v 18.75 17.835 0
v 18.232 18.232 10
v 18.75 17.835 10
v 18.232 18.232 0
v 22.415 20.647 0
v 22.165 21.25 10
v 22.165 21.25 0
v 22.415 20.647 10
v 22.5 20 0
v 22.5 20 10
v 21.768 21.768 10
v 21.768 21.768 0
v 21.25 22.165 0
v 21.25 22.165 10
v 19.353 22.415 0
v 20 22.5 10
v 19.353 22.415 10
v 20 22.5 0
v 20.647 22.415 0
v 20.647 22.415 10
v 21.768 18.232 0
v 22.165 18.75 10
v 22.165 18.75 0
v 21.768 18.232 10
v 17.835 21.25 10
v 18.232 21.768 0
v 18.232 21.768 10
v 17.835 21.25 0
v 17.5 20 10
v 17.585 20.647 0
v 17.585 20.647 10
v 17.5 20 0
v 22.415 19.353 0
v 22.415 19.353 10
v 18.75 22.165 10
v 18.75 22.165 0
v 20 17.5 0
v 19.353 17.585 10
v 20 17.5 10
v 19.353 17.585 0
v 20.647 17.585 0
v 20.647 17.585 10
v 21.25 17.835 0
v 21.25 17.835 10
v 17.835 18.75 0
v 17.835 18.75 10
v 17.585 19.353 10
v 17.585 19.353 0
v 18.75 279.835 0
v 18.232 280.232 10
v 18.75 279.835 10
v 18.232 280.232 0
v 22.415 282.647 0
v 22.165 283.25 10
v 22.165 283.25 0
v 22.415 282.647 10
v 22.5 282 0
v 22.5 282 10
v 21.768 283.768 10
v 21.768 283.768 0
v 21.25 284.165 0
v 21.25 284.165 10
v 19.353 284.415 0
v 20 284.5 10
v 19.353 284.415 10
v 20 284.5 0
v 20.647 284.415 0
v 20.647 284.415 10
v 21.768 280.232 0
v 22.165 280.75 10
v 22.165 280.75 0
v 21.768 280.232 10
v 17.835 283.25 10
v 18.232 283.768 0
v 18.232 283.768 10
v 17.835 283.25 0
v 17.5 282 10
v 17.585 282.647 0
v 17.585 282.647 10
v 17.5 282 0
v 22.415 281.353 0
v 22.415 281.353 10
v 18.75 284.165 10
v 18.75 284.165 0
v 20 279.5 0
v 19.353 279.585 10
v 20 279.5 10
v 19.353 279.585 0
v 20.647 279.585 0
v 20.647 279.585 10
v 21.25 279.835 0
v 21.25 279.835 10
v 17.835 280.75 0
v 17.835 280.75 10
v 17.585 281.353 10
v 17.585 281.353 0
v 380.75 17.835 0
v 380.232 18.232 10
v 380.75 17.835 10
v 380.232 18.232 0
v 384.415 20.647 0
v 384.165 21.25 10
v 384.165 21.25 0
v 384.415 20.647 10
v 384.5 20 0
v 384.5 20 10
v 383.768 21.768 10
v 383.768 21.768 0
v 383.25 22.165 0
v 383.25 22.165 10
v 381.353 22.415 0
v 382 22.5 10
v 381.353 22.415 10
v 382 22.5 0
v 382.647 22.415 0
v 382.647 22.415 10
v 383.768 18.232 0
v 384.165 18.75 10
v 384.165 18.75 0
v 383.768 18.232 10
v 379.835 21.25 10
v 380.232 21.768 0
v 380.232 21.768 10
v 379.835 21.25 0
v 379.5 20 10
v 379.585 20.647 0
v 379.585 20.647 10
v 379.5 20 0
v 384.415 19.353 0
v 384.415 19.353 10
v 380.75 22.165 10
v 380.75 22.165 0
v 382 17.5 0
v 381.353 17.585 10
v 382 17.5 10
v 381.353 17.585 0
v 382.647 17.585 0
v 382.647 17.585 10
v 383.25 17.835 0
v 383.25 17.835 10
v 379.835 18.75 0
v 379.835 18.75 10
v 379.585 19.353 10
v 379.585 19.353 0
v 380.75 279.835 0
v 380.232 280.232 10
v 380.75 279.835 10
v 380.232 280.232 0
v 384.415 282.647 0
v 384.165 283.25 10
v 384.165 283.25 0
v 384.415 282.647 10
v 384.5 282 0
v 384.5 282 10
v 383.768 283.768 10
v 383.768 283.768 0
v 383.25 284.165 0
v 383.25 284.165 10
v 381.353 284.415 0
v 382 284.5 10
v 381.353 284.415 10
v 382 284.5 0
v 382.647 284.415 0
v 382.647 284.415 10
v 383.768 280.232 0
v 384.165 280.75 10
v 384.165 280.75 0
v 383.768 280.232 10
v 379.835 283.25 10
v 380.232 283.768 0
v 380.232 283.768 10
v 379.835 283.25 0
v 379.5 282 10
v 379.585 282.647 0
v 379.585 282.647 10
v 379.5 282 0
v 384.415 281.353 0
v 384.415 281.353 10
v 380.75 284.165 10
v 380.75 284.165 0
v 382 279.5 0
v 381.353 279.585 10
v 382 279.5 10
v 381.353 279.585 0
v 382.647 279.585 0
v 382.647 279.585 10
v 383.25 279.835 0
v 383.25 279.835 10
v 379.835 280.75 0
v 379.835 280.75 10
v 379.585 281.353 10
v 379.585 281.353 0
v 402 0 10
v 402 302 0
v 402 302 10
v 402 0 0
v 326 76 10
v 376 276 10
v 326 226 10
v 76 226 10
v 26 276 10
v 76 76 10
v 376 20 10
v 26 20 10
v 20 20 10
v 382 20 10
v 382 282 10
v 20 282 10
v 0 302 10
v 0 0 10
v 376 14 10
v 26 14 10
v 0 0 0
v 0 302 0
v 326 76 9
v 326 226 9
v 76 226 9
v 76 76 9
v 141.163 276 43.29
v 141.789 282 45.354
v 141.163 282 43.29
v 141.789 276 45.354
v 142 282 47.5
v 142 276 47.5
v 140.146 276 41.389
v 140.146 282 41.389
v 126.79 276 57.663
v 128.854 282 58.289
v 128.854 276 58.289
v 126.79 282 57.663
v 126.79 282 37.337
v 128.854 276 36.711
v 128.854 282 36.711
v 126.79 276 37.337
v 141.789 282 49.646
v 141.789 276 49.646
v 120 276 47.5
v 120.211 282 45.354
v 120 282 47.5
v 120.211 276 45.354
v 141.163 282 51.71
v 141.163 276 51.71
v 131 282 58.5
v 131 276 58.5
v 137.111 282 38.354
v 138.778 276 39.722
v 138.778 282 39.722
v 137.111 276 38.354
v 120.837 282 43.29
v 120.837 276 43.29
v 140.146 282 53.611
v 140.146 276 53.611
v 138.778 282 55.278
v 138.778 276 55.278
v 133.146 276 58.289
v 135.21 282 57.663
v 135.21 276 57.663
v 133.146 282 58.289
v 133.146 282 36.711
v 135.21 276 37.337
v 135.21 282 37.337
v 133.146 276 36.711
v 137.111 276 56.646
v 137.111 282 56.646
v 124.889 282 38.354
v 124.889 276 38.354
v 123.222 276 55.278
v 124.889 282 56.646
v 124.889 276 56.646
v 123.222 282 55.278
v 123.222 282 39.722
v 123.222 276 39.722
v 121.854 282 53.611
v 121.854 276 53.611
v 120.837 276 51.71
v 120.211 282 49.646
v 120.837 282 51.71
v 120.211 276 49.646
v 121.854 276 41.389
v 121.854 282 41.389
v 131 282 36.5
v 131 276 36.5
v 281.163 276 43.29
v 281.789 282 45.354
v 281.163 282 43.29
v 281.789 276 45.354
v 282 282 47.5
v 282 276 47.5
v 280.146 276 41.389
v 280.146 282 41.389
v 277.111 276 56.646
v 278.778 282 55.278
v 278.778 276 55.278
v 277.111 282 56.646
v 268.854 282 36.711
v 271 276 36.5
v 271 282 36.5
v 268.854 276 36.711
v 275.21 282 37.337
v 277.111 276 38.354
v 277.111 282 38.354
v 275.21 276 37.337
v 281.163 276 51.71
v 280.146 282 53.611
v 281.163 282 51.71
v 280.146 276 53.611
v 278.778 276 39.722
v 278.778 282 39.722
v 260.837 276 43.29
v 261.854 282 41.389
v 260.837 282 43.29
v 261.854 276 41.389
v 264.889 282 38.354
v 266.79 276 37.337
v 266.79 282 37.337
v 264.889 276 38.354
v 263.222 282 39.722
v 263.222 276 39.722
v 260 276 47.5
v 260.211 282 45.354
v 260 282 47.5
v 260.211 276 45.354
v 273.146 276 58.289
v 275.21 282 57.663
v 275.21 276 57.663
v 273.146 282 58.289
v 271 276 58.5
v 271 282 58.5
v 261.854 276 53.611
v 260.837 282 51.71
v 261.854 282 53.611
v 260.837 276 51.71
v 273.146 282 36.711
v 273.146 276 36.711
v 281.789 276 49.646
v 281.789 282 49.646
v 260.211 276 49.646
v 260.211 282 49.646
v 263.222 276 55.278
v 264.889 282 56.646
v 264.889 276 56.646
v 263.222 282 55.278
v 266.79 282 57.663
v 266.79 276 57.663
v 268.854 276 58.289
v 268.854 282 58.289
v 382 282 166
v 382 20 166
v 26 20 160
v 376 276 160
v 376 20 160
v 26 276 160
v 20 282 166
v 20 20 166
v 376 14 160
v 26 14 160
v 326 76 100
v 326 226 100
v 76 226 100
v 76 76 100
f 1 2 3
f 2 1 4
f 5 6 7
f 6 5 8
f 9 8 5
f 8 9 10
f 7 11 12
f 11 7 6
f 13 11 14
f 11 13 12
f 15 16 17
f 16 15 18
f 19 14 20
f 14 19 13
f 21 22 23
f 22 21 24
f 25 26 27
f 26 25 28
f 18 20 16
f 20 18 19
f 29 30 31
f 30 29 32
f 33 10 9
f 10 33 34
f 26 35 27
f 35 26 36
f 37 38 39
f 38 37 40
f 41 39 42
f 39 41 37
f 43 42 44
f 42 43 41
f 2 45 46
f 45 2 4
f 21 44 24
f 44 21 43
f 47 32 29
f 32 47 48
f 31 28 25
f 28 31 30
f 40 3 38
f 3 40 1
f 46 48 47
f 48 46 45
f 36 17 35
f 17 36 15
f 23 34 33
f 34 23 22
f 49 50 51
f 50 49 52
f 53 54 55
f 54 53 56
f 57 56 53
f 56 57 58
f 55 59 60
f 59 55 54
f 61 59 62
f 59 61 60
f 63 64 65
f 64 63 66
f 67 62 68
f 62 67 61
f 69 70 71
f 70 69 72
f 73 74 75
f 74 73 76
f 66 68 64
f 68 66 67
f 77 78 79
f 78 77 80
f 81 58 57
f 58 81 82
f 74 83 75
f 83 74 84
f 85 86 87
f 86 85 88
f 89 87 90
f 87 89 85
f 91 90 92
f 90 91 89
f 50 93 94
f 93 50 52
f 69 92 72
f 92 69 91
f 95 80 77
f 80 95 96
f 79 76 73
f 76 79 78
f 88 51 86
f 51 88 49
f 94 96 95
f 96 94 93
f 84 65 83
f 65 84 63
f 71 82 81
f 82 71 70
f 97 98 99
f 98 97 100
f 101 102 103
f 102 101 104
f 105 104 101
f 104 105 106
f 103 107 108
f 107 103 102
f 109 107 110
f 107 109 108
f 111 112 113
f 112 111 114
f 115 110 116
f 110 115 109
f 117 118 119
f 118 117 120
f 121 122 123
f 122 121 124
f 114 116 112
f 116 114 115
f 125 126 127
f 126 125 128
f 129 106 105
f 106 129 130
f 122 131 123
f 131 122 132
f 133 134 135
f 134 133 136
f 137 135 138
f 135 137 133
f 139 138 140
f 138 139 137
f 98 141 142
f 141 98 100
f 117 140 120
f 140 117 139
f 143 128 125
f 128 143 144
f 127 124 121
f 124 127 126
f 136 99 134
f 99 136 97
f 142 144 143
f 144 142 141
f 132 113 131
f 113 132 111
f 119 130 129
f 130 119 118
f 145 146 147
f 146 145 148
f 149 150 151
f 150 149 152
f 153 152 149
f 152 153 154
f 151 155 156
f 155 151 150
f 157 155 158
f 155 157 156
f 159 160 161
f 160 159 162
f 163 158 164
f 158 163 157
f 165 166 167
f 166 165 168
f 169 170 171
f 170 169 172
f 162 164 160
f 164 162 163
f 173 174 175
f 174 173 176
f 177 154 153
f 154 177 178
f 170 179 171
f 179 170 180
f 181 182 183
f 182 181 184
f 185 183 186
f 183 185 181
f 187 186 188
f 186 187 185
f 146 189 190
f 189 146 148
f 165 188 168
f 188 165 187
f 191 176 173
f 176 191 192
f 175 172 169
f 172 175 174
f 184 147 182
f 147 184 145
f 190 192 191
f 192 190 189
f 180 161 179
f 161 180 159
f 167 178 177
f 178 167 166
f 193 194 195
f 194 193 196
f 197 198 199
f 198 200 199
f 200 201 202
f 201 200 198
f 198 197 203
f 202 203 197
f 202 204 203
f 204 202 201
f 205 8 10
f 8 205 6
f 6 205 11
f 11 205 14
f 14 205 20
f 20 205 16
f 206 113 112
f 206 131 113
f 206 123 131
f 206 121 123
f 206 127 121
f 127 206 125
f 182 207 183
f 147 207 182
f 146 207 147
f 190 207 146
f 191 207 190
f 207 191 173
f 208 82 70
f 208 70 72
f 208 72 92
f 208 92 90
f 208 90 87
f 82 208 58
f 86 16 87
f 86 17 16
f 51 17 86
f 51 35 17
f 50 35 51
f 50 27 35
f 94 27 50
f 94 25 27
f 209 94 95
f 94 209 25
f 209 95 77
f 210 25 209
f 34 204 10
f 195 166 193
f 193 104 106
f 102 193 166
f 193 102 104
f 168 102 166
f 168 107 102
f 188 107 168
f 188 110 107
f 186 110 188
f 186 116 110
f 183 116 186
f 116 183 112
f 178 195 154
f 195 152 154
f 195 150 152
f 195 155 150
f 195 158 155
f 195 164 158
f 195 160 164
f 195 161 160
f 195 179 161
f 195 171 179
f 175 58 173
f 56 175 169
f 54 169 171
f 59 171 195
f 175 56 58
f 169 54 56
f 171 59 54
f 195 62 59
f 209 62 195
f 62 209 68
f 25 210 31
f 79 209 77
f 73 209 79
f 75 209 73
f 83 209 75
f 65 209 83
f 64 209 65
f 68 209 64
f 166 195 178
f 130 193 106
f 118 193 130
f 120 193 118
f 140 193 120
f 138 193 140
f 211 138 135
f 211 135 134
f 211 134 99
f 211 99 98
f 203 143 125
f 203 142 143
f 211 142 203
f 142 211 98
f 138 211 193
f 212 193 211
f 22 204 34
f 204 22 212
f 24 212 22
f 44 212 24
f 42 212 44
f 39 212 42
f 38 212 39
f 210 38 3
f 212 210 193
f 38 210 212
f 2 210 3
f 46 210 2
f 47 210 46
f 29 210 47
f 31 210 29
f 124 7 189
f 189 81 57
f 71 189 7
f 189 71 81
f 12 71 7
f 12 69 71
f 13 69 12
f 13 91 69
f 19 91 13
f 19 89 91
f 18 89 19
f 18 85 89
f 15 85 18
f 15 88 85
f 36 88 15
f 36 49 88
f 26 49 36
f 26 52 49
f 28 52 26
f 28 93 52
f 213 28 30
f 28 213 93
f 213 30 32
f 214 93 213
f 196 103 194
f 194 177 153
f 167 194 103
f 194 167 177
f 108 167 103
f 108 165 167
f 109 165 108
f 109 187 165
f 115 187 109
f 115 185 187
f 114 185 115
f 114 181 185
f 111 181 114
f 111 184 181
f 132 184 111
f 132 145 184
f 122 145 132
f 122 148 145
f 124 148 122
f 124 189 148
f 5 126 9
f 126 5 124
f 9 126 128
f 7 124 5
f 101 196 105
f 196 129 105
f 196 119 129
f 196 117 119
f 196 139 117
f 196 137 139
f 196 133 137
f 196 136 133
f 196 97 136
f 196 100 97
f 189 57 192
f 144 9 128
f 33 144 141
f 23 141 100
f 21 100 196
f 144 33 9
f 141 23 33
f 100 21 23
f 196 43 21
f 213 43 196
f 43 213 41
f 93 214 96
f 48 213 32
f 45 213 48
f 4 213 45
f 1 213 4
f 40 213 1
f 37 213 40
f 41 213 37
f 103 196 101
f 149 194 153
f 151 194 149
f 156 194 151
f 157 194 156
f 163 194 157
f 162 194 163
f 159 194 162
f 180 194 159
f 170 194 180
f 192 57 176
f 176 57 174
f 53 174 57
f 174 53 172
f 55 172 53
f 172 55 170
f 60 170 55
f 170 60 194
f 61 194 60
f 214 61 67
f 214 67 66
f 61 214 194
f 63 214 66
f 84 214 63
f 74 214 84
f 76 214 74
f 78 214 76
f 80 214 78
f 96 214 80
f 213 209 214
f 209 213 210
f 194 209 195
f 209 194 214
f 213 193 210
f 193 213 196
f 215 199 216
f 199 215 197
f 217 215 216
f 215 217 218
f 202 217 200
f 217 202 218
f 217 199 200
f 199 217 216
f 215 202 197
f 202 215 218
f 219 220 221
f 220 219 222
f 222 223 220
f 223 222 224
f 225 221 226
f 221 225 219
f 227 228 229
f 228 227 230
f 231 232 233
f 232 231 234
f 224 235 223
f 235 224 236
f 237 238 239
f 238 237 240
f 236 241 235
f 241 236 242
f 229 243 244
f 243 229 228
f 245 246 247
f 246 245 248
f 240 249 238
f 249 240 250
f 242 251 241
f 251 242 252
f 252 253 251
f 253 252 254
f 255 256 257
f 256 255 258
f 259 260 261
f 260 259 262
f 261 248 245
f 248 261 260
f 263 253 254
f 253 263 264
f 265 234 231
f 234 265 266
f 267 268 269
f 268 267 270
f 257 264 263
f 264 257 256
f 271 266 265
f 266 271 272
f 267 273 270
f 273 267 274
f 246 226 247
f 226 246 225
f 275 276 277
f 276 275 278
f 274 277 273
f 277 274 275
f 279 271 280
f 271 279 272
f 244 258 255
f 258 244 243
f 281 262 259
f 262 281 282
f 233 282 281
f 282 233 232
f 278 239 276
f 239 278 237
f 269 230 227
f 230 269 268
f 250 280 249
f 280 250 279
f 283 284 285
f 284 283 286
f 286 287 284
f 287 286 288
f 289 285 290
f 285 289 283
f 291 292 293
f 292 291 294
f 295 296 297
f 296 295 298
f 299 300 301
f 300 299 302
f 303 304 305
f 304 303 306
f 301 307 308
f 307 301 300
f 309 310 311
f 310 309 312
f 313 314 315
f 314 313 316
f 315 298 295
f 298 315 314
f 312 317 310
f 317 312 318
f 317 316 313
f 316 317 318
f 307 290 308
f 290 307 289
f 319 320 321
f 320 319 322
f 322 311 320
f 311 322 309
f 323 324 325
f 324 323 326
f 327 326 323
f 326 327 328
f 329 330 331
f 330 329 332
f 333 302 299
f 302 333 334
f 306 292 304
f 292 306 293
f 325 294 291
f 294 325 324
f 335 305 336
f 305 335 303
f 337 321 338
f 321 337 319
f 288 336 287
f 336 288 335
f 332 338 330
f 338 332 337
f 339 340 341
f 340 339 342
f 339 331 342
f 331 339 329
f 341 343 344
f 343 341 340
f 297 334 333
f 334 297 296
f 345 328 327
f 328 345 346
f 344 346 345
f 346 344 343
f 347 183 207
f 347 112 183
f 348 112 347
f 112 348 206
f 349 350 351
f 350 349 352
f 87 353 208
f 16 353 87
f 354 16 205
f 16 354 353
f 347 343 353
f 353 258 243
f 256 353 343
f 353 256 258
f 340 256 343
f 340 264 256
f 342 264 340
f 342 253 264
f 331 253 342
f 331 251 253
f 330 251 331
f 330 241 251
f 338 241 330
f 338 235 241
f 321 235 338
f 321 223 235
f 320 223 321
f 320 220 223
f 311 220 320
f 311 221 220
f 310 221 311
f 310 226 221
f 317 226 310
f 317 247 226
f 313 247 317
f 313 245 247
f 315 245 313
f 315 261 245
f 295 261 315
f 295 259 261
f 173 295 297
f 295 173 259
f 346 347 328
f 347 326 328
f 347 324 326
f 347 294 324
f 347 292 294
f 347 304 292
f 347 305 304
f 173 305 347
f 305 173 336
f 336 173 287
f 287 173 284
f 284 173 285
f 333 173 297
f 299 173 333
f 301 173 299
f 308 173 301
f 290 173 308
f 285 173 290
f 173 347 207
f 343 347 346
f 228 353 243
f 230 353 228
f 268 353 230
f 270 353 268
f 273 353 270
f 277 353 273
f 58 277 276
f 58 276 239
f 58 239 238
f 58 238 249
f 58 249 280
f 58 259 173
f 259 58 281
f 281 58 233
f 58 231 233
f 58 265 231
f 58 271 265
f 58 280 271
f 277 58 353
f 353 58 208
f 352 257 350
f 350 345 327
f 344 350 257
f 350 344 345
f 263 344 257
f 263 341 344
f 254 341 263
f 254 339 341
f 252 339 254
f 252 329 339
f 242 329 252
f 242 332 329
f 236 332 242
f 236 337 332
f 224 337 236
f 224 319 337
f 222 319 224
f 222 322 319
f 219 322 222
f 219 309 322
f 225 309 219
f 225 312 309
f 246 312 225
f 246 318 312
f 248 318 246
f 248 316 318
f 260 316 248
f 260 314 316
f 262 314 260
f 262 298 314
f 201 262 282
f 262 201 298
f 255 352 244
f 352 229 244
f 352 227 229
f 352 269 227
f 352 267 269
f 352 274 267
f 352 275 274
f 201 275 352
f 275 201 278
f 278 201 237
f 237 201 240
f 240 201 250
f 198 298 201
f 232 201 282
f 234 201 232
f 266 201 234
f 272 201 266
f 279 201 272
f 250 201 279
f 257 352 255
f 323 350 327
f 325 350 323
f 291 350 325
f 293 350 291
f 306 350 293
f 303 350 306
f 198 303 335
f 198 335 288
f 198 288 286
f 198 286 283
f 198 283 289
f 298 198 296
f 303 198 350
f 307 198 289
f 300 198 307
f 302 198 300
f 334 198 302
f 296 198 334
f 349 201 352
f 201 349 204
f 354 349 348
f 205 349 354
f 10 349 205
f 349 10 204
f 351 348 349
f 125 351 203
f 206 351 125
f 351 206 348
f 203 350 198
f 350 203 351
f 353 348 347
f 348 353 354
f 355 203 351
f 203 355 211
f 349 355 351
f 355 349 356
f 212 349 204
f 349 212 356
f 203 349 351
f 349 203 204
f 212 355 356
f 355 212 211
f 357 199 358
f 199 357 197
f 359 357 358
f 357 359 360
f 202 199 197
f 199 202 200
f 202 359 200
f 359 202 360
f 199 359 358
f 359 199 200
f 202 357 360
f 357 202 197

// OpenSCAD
// Interlocked HV test enclosure for the charger (flat-pack acrylic/PC hood + printed/phenolic base).
// NOT YET RENDERED OR MEASURED - charger_* values are estimates from a photo. Measure the real
// charger and edit the PARAMETERS block, then export parts:  openscad -D 'part="bom"' ...
// part = "assembly" | "base" | "hood" | "bom"

part = "assembly";

// ---------- PARAMETERS (mm) ----------
charger_l = 250;  charger_w = 150;  charger_h = 90;   // ASSUMED: housing incl. mounting flange
hv_clearance = 50;     // min air gap from charger / HV clips to any conductive part or hood wall
top_clearance = 60;    // headroom for leads + alligator clips
panel_t = 6;           // clear polycarbonate (preferred) or acrylic; non-conductive
base_t = 10;           // FR4 / phenolic / HDPE sheet; do NOT use metal or plywood
lead_hole_d = 22;      // input cord + output lead pass-through (back panel, grommeted)
switch_w = 28; switch_h = 16;  // safety interlock microswitch pocket (lid side)
mat_l = 600; mat_w = 450;      // insulating mat under whole fixture (see docs/03)

in_l = charger_l + 2*hv_clearance;
in_w = charger_w + 2*hv_clearance;
in_h = charger_h + top_clearance;
base_l = in_l + 2*panel_t + 40;  base_w = in_w + 2*panel_t + 40;

module base() {
  difference() {
    cube([base_l, base_w, base_t]);
    // charger location marks (shallow 1 mm engraving) + cable relief
    translate([(base_l-charger_l)/2, (base_w-charger_w)/2, base_t-1]) cube([charger_l, charger_w, 2]);
    for (x=[20, base_l-20], y=[20, base_w-20]) translate([x,y,-1]) cylinder(d=5, h=base_t+2, $fn=24); // M5 mat studs
  }
}

module panel(sz) cube(sz);

module hood() {
  ox = (base_l-in_l)/2 - panel_t;  oy = (base_w-in_w)/2 - panel_t;
  translate([ox, oy, base_t]) {
    // back (cable) panel with two grommet holes
    difference() { translate([0, in_w+panel_t, 0]) panel([in_l+2*panel_t, panel_t, in_h]);
      for (x=[in_l*0.3, in_l*0.7]) translate([x+panel_t, in_w+panel_t-1, in_h*0.25]) rotate([-90,0,0]) cylinder(d=lead_hole_d, h=panel_t+2, $fn=32); }
    panel([panel_t, in_w+panel_t, in_h]);                              // left
    translate([in_l+panel_t, 0, 0]) panel([panel_t, in_w+panel_t, in_h]); // right
    translate([0, 0, in_h]) panel([in_l+2*panel_t, in_w+2*panel_t, panel_t]); // top
    // front door (hinged at top; opening it must open the interlock switch)
    color("lightblue", 0.4) translate([panel_t, -panel_t, 0]) panel([in_l, panel_t, in_h]);
  }
}

module bom() {
  echo(str("BASE  : ", base_l, " x ", base_w, " x ", base_t, " mm  qty 1"));
  echo(str("BACK  : ", in_l+2*panel_t, " x ", in_h, " x ", panel_t, " mm  qty 1 (2x D", lead_hole_d, " holes)"));
  echo(str("SIDES : ", in_w+panel_t, " x ", in_h, " x ", panel_t, " mm  qty 2"));
  echo(str("TOP   : ", in_l+2*panel_t, " x ", in_w+2*panel_t, " x ", panel_t, " mm  qty 1"));
  echo(str("DOOR  : ", in_l, " x ", in_h, " x ", panel_t, " mm  qty 1 (hinge top, + switch pocket ", switch_w, "x", switch_h, ")"));
  echo(str("MAT   : ", mat_l, " x ", mat_w, " mm insulating mat"));
}

if (part == "base") base();
else if (part == "hood") hood();
else if (part == "bom") bom();
else {
  color("dimgray") base();
  hood();
  // charger placeholder
  color("slategray") translate([(base_l-charger_l)/2, (base_w-charger_w)/2, base_t]) cube([charger_l, charger_w, charger_h]);
}
